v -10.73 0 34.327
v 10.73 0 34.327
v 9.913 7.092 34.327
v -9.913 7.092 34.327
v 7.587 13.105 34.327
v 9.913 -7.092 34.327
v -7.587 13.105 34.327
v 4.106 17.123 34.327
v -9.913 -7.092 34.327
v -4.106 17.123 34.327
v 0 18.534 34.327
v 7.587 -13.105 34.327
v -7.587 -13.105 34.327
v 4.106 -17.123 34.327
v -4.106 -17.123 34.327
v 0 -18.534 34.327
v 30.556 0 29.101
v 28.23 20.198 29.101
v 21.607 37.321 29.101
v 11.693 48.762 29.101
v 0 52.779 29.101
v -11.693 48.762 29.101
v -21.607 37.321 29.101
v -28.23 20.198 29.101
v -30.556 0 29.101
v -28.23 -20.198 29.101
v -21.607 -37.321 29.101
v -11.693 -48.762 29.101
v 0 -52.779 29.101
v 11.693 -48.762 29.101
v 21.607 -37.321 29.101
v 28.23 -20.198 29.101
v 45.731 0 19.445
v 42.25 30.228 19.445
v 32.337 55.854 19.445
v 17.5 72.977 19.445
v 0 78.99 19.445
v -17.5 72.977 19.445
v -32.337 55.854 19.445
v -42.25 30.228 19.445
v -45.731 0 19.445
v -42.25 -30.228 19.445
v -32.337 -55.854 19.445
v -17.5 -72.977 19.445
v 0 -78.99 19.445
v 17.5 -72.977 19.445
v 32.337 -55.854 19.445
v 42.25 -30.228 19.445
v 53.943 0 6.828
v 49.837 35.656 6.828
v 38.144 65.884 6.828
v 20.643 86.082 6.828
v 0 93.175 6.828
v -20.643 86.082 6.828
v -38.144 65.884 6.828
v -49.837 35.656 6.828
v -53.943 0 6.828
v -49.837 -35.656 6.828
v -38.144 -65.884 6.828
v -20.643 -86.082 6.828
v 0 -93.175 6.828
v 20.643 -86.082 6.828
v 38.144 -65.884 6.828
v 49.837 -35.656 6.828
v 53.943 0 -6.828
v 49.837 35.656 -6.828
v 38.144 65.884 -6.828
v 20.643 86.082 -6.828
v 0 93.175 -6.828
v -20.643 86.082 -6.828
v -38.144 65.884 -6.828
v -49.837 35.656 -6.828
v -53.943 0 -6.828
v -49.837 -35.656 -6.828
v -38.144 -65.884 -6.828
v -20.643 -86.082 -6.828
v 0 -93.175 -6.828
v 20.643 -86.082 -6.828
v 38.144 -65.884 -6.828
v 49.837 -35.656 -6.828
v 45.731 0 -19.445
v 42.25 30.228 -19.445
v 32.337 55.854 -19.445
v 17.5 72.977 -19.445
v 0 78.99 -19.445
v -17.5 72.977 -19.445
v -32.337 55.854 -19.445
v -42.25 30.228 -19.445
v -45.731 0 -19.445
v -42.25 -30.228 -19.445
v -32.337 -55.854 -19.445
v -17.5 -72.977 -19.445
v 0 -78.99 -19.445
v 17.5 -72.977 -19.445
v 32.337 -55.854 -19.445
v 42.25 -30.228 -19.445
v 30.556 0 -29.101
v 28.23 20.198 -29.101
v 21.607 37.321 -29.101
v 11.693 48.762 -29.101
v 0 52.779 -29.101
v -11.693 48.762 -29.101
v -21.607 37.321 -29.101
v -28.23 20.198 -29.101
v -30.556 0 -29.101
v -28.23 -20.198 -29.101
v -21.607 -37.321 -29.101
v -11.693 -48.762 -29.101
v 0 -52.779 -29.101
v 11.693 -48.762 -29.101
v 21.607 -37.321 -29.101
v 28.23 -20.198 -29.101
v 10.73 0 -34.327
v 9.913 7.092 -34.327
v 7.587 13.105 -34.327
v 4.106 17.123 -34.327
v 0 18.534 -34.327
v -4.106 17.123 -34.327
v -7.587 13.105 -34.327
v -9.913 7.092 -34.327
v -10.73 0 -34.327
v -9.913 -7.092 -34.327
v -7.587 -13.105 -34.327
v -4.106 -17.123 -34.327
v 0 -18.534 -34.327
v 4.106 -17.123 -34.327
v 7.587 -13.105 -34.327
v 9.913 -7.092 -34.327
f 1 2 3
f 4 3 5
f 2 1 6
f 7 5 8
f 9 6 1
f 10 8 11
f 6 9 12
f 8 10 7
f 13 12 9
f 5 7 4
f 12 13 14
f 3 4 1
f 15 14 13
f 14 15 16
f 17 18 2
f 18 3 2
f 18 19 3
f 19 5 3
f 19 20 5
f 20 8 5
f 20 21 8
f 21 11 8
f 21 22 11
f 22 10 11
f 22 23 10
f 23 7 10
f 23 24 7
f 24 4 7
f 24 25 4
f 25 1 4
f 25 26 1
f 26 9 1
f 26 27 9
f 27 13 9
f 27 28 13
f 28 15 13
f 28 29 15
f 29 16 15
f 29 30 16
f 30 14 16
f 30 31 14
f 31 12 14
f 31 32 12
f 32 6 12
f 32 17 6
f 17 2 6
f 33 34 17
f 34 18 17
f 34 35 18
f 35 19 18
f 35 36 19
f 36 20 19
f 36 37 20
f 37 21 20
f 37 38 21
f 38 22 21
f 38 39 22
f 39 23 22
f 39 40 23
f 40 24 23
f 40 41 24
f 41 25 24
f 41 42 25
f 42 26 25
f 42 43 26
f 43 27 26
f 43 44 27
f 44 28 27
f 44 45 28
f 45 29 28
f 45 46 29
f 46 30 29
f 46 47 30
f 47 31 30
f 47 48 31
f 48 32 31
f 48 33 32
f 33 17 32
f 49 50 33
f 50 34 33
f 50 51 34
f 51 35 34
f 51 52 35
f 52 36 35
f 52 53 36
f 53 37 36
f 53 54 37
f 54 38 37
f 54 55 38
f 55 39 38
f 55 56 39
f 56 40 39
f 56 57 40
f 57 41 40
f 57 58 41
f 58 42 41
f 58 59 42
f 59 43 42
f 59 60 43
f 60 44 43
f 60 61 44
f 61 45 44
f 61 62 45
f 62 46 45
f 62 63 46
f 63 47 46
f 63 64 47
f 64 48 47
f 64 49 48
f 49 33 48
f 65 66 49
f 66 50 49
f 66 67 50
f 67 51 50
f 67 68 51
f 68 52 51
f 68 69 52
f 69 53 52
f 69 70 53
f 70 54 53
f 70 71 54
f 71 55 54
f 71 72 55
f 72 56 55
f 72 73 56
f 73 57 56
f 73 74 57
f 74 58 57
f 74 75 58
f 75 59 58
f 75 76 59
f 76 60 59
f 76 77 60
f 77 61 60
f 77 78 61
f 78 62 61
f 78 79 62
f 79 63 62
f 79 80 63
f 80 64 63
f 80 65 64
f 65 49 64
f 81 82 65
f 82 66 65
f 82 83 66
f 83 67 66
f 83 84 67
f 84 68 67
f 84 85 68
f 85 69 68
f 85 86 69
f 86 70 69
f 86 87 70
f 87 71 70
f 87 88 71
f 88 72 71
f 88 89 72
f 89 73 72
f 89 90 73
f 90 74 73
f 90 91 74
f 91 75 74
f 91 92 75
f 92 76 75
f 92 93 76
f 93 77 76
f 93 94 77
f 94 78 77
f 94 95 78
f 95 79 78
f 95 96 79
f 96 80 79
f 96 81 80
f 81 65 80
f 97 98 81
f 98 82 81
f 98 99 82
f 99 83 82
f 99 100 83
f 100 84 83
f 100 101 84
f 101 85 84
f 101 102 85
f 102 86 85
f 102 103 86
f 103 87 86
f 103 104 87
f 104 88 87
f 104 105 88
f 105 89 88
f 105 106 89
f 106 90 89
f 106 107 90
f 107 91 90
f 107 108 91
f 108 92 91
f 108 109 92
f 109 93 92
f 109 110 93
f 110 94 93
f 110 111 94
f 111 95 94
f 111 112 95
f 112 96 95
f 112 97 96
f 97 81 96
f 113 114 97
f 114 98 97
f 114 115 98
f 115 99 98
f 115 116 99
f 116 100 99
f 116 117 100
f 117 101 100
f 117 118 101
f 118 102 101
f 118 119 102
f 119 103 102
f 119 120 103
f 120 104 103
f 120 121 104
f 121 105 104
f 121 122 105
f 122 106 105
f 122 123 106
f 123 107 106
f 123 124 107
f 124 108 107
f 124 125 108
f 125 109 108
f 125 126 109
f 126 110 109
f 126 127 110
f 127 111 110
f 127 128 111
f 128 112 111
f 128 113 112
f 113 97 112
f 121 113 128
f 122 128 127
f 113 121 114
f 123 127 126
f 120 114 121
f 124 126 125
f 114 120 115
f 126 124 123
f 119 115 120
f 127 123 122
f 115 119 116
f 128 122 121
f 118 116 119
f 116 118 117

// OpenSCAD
// Generated by SolidPython 1.0.1 on 2020-07-29 00:46:50


scale(v = [11, 19, 7]) {
	sphere(r = 5);
}
/***********************************************
*********      SolidPython code:      **********
************************************************
 
# import packages: SolidPython
from solid import *
from solid.utils import *
from itertools import chain, combinations, permutations


class Resize:

    def __init__(self, scad_file):
        self.scad_file = scad_file
        #self.scad_file = import_scad(scad_file)
        # cone/cylinder param:
        self.r1 = 0
        self.r2 = 0
        self.h = 0
        # rectangular prism param:
        self.w = 0
        self.l = 0
        # ellipse param:
        self.r = 0

    # import OpenScad code (file name corresponds to shape)


    # classify shape + parameters
    def assign(self, param1, param2, param3):
        if self.scad_file == 'cone.scad':
            self.r1 = param1
            self.r2 = param2
            self.h = param3
        elif self.scad_file == 'cylinder.scad':
            self.r1 = param1
            self.r2 = param2
            self.h = param3
        elif self.scad_file == 'rectangularPrism.scad':
            self.h = param1
            self.l = param2
            self.w = param3
        else:
            self.r = param1
            self.h = param2

    # resize parameters
    def iterate(self):
        x = range(3, 20, 2)
        i = 1
        if self.scad_file == 'cone.scad':
            tempList = list(permutations(x, 2))
            for temp in tempList:
                param1 = temp[0]
                param2 = temp[1]
                filepath = 'produced_scad_files/' + 'cone' + str(param1) + '_' + str(param2) + '_' + '.scad'
                scad_render_to_file(cylinder(h=param1, r1=param2, r2=0), filepath)

        elif self.scad_file == 'cylinder.scad':
            tempList = list(permutations(x, 3))
            for temp in tempList:
                param1 = temp[0]
                param2 = temp[1]
                filepath = 'produced_scad_files/' + 'cylinder' + str(param1) + '_' + str(param2) + '_' + '.scad'
                scad_render_to_file(cylinder(h=param1, r1=param2, r2=param2), filepath)

        elif self.scad_file == 'rectangularPrism.scad':
            tempList = list(permutations(x, 3))
            for temp in tempList:
                param1 = temp[0]
                param2 = temp[1]
                param3 = temp[2]
                filepath = 'produced_scad_files/' + 'rectangularPrism' + str(param1) + '_' + str(param2) + '_' + str(
                    param3) + '.scad'
                scad_render_to_file(cube(size=(param1, param2, param3)), filepath)

        elif self.scad_file == 'ellipse.scad':
            tempList = list(permutations(x, 4))
            for temp in tempList:
                param1 = temp[0]
                param2 = temp[1]
                param3 = temp[2]
                param4 = temp[3]
                filepath = 'produced_scad_files/' + 'ellipse' + str(param1) + '_' + str(param2) + '_' + str(param3) + '_' + str(param4) + '.scad'
                scad_render_to_file(scale([param1, param2, param3])(sphere(r=param4)), filepath)

    def render_to_scadfile(self):
        scad_render_to_file(scad, 'example.scad') 
 
************************************************/
